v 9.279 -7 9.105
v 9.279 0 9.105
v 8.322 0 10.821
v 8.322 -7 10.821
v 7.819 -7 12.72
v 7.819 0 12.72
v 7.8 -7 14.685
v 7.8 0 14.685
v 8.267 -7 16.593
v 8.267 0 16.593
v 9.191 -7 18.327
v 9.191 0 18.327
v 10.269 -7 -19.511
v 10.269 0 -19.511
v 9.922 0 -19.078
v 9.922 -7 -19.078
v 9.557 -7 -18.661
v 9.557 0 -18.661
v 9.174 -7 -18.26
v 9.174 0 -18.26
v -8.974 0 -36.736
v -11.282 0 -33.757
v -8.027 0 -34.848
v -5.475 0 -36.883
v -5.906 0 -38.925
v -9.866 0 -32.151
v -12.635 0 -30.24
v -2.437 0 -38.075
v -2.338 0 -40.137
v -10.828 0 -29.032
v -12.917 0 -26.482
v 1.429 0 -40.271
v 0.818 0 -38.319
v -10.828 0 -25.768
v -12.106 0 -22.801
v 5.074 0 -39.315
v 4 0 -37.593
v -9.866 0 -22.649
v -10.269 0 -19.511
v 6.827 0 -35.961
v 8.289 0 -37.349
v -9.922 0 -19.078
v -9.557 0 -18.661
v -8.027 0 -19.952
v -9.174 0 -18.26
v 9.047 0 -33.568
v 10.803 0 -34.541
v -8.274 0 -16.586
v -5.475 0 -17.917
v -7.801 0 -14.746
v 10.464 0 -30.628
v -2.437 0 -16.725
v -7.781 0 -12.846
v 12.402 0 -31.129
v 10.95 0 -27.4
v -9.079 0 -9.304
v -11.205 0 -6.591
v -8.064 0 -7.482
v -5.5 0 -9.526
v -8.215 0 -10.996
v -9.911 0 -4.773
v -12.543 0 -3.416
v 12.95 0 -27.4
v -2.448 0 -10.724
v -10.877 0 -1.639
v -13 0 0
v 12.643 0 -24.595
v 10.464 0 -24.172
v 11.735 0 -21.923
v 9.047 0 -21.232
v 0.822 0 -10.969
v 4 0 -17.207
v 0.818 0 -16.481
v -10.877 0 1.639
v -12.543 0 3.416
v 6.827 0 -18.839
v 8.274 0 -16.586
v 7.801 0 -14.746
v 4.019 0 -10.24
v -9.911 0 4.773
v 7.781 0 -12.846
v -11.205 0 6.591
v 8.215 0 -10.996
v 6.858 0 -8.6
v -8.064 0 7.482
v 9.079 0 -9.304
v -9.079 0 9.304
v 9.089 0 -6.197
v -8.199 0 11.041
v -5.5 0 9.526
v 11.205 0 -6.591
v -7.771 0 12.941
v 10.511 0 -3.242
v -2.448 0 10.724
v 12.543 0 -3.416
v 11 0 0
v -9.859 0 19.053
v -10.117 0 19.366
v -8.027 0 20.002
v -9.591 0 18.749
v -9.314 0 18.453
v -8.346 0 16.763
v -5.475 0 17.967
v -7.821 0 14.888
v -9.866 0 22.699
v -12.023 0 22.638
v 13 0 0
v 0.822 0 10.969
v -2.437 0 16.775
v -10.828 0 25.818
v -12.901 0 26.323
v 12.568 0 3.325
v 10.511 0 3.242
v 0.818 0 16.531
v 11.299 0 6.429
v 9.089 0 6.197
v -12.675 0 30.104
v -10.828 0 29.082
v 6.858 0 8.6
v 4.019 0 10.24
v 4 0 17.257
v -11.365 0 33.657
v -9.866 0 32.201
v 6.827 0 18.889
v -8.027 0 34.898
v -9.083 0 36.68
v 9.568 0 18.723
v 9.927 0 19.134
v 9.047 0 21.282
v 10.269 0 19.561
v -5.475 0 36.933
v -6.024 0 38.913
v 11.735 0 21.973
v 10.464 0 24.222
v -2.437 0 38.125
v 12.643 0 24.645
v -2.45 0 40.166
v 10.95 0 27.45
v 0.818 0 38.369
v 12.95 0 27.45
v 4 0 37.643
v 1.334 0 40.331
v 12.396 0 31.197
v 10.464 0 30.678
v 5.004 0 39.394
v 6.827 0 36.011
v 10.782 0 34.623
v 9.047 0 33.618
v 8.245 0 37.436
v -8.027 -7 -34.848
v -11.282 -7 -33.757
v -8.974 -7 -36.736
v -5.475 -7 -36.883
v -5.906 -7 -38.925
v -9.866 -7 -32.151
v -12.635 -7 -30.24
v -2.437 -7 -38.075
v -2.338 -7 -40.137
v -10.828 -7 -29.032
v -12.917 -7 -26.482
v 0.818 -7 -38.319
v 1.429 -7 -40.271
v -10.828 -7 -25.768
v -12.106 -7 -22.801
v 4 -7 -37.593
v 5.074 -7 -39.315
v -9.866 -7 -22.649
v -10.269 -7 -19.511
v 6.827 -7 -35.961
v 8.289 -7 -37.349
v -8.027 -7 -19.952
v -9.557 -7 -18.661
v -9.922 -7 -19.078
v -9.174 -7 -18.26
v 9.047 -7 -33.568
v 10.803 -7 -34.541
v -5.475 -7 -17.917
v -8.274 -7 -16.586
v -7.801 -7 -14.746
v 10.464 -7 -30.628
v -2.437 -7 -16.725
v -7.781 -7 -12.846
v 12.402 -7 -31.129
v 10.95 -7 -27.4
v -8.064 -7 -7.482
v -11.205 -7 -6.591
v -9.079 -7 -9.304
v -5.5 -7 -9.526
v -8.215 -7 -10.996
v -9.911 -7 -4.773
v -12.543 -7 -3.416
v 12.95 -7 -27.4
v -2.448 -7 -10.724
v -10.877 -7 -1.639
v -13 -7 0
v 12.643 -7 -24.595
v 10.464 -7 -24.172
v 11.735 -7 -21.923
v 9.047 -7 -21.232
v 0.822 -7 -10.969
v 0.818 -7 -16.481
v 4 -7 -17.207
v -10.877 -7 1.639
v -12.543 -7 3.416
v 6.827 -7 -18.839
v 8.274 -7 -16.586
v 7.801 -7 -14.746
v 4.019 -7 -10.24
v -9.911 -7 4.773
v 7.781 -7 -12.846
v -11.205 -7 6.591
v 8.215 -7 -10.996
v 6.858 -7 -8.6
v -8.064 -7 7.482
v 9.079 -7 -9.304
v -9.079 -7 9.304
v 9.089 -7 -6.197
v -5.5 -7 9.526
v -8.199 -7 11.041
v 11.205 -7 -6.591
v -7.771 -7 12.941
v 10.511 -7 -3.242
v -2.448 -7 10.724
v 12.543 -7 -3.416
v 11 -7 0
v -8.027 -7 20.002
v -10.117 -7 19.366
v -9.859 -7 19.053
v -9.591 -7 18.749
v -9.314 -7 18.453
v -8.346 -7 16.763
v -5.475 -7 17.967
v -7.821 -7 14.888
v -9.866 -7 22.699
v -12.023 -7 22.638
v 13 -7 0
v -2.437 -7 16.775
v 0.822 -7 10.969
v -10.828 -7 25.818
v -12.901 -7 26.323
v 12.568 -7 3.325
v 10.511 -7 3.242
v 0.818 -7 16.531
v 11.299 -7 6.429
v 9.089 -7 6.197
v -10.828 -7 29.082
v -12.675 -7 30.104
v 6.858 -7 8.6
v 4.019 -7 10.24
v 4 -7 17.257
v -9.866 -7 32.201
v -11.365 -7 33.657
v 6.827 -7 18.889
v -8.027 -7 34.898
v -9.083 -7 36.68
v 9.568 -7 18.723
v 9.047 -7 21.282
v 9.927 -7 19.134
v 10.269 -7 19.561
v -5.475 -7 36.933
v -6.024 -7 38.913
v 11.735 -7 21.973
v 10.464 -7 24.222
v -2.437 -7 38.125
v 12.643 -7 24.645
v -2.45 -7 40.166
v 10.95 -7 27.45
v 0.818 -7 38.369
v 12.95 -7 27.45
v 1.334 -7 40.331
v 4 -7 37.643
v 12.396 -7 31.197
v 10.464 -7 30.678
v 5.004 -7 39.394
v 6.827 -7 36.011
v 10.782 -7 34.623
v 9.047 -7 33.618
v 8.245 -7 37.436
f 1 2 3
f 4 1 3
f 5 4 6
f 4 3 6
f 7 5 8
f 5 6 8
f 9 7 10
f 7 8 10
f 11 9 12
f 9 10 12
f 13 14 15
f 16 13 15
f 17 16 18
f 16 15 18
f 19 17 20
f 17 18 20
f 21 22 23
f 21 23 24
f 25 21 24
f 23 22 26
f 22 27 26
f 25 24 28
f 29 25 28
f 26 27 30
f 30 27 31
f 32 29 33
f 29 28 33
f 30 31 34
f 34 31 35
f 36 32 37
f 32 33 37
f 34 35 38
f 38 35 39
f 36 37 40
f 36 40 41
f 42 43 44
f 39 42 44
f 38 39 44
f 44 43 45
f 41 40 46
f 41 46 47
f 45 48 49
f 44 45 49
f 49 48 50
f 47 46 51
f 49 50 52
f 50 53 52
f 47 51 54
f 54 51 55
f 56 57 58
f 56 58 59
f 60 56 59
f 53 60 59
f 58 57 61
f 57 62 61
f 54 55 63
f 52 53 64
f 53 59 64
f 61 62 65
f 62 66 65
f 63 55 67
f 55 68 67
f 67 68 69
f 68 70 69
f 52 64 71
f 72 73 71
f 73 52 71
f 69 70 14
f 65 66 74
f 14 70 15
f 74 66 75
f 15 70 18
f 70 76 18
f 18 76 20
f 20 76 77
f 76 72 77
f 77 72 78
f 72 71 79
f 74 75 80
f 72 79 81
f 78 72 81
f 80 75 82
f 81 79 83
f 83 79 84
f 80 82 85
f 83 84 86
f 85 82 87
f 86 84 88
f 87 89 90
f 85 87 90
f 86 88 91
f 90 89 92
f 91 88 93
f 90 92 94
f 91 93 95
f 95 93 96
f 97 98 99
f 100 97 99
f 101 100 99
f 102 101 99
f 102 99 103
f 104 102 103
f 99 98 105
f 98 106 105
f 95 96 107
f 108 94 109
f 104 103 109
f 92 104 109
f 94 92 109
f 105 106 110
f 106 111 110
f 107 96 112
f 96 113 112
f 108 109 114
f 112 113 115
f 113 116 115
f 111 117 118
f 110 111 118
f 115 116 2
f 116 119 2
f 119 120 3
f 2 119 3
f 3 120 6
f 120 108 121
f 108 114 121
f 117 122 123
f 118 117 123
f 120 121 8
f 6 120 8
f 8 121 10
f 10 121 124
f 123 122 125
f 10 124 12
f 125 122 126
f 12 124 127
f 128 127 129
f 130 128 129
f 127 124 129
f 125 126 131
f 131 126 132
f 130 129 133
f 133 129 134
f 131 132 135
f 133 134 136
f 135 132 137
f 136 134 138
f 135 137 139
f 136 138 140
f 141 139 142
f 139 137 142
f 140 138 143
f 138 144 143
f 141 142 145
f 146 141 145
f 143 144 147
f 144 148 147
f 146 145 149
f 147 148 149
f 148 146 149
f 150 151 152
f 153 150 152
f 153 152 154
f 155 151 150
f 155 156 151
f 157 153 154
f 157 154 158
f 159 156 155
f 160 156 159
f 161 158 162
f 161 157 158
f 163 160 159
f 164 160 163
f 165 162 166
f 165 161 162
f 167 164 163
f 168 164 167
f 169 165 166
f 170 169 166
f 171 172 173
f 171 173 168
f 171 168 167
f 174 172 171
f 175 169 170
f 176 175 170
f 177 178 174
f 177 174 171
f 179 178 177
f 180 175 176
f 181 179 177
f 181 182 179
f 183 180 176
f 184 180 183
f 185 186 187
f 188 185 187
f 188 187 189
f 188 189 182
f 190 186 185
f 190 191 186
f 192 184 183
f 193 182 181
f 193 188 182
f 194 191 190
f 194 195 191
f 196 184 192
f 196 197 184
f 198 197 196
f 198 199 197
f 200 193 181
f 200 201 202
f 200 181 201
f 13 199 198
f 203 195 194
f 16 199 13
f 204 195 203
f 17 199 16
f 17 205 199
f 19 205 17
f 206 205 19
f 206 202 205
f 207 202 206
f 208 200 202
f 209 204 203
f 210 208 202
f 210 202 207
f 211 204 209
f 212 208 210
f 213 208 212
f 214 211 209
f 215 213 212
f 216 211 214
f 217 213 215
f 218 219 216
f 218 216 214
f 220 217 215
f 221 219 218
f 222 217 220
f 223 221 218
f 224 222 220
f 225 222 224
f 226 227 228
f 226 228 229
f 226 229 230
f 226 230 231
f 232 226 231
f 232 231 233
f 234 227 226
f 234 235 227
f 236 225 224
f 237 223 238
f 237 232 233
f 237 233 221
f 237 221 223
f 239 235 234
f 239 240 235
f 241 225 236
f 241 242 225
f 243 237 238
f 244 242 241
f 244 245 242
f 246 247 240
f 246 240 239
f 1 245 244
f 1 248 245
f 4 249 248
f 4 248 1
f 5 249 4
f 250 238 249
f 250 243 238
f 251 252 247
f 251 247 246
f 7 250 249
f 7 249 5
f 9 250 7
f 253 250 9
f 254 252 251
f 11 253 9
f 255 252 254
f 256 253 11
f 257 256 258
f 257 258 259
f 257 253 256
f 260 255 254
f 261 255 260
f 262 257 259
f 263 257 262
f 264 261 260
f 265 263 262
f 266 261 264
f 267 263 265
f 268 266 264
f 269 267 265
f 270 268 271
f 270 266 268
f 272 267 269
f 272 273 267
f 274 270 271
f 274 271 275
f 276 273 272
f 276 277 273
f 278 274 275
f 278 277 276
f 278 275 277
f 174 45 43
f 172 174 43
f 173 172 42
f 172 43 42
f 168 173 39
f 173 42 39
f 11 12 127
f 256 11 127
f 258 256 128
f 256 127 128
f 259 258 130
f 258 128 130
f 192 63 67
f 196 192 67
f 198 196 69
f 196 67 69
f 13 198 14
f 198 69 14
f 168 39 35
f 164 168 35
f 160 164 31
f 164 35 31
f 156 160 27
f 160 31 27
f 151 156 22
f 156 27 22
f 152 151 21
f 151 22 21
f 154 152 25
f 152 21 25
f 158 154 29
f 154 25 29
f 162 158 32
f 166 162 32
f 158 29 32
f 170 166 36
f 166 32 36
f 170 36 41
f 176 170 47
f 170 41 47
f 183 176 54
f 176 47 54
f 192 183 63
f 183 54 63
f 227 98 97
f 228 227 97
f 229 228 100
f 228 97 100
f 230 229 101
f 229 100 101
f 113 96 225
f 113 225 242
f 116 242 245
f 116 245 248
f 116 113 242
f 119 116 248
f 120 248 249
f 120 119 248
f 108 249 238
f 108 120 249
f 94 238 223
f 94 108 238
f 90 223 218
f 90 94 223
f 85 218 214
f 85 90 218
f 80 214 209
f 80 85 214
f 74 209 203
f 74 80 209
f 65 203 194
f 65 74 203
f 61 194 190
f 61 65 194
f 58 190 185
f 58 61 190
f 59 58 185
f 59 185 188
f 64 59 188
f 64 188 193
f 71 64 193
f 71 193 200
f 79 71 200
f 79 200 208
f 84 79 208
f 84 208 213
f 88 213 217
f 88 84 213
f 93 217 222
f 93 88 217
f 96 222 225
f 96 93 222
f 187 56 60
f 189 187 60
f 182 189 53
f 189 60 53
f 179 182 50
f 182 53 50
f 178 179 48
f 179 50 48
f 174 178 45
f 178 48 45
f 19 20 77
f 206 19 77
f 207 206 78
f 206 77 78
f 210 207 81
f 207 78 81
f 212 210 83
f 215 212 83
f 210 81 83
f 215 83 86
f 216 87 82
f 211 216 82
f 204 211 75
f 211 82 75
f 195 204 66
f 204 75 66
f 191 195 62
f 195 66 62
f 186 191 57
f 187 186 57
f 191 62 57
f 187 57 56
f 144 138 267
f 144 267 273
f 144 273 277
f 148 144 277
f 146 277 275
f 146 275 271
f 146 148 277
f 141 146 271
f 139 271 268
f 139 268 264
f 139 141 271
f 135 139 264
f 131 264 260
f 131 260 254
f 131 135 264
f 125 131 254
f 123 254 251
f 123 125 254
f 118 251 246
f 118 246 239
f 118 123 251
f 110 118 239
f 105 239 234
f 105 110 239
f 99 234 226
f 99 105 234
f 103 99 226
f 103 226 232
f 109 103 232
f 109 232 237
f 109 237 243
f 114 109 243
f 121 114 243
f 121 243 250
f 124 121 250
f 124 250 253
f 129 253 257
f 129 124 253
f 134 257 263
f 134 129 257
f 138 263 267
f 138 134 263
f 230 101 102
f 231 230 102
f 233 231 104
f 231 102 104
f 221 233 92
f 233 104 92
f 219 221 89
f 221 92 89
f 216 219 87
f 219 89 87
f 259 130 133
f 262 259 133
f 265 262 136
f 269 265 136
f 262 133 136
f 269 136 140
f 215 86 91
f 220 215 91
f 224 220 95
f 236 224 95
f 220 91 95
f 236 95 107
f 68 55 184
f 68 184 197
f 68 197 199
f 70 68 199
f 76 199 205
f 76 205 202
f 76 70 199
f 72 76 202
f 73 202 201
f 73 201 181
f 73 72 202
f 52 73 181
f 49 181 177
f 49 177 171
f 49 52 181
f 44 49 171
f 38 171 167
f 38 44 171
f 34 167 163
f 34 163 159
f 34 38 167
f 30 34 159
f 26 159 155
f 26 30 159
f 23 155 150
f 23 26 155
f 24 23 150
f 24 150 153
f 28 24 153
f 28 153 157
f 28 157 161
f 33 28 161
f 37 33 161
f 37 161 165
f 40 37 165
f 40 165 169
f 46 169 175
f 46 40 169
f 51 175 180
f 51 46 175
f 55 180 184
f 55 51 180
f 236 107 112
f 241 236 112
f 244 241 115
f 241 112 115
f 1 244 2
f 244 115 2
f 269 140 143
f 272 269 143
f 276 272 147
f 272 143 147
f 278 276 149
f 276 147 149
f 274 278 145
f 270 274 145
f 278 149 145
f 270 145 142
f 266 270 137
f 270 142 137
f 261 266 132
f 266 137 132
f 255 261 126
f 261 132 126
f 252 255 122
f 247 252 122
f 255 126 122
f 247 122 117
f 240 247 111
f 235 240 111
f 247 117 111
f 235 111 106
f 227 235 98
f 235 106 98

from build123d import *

# Parameters (mm, degrees)
F0_R     = 11
F0_R_2   = 10.95
F1_DEPTH = 7


with BuildPart() as f1:
    # F0 (on Front) → F1 (new body)
    with BuildSketch(Plane.XZ):
        with BuildLine():
            ThreePointArc((9.079472, -9.303934), (11.97984, -5.048112), (13, 0))
            ThreePointArc((13, 0), (12.033855, 4.917961), (9.279025, 9.104927))
            ThreePointArc((9.279025, 9.104927), (0.140912, 12.999236), (-9.079472, 9.303934))
            ThreePointArc((-9.079472, 9.303934), (-13, 0), (-9.079472, -9.303934))
            ThreePointArc((-9.079472, -9.303934), (0, -13), (9.079472, -9.303934))
        make_face()
        Circle(F0_R, mode=Mode.SUBTRACT)
        with BuildLine():
            ThreePointArc((-9.079472, 9.303934), (0.140912, 12.999236), (9.279025, 9.104927))
            ThreePointArc((9.279025, 9.104927), (7.748031, 13.701905), (9.191158, 18.32722))
            ThreePointArc((9.191158, 18.32722), (-0.088011, 14.500299), (-9.314307, 18.45299))
            ThreePointArc((-9.314307, 18.45299), (-7.735521, 13.915972), (-9.079472, 9.303934))
        make_face()
        with BuildLine():
            ThreePointArc((9.173578, -18.259543), (7.733358, -13.796378), (9.079472, -9.303934))
            ThreePointArc((9.079472, -9.303934), (0, -13), (-9.079472, -9.303934))
            ThreePointArc((-9.079472, -9.303934), (-7.733358, -13.796378), (-9.173578, -18.259543))
            ThreePointArc((-9.173578, -18.259543), (0, -14.45), (9.173578, -18.259543))
        make_face()
        with BuildLine():
            ThreePointArc((10.26943, 19.560684), (9.698205, 18.972004), (9.191158, 18.32722))
            ThreePointArc((9.191158, 18.32722), (9.74982, 18.926883), (10.26943, 19.560684))
        make_face()
        with BuildLine():
            ThreePointArc((-9.314307, 18.45299), (-0.088011, 14.500299), (9.191158, 18.32722))
            ThreePointArc((9.191158, 18.32722), (9.698205, 18.972004), (10.26943, 19.560684))
            ThreePointArc((10.26943, 19.560684), (12.261558, 23.283864), (12.95, 27.45))
            ThreePointArc((12.95, 27.45), (-4.283246, 39.671142), (-10.116611, 19.365652))
            ThreePointArc((-10.116611, 19.365652), (-9.697869, 18.924783), (-9.314307, 18.45299))
        make_face()
        with Locations((0, 27.45)):
            Circle(F0_R_2, mode=Mode.SUBTRACT)
        with BuildLine():
            ThreePointArc((10.26943, -19.510684), (9.688458, -18.914058), (9.173578, -18.259543))
            ThreePointArc((9.173578, -18.259543), (0, -14.45), (-9.173578, -18.259543))
            ThreePointArc((-9.173578, -18.259543), (-9.688458, -18.914058), (-10.26943, -19.510684))
            ThreePointArc((-10.26943, -19.510684), (-4.166136, -39.661558), (12.95, -27.4))
            ThreePointArc((12.95, -27.4), (12.261558, -23.233864), (10.26943, -19.510684))
        make_face()
        with Locations((0, -27.4)):
            Circle(F0_R_2, mode=Mode.SUBTRACT)
        with BuildLine():
            ThreePointArc((10.26943, -19.510684), (9.741611, -18.867502), (9.173578, -18.259543))
            ThreePointArc((9.173578, -18.259543), (9.688458, -18.914058), (10.26943, -19.510684))
        make_face()
        with BuildLine():
            ThreePointArc((-10.116611, 19.365652), (-9.72617, 18.899905), (-9.314307, 18.45299))
            ThreePointArc((-9.314307, 18.45299), (-9.697869, 18.924783), (-10.116611, 19.365652))
        make_face()
        with BuildLine():
            ThreePointArc((-10.26943, -19.510684), (-9.688458, -18.914058), (-9.173578, -18.259543))
            ThreePointArc((-9.173578, -18.259543), (-9.741611, -18.867502), (-10.26943, -19.510684))
        make_face()
    extrude(amount=F1_DEPTH)


solid = f1.part
